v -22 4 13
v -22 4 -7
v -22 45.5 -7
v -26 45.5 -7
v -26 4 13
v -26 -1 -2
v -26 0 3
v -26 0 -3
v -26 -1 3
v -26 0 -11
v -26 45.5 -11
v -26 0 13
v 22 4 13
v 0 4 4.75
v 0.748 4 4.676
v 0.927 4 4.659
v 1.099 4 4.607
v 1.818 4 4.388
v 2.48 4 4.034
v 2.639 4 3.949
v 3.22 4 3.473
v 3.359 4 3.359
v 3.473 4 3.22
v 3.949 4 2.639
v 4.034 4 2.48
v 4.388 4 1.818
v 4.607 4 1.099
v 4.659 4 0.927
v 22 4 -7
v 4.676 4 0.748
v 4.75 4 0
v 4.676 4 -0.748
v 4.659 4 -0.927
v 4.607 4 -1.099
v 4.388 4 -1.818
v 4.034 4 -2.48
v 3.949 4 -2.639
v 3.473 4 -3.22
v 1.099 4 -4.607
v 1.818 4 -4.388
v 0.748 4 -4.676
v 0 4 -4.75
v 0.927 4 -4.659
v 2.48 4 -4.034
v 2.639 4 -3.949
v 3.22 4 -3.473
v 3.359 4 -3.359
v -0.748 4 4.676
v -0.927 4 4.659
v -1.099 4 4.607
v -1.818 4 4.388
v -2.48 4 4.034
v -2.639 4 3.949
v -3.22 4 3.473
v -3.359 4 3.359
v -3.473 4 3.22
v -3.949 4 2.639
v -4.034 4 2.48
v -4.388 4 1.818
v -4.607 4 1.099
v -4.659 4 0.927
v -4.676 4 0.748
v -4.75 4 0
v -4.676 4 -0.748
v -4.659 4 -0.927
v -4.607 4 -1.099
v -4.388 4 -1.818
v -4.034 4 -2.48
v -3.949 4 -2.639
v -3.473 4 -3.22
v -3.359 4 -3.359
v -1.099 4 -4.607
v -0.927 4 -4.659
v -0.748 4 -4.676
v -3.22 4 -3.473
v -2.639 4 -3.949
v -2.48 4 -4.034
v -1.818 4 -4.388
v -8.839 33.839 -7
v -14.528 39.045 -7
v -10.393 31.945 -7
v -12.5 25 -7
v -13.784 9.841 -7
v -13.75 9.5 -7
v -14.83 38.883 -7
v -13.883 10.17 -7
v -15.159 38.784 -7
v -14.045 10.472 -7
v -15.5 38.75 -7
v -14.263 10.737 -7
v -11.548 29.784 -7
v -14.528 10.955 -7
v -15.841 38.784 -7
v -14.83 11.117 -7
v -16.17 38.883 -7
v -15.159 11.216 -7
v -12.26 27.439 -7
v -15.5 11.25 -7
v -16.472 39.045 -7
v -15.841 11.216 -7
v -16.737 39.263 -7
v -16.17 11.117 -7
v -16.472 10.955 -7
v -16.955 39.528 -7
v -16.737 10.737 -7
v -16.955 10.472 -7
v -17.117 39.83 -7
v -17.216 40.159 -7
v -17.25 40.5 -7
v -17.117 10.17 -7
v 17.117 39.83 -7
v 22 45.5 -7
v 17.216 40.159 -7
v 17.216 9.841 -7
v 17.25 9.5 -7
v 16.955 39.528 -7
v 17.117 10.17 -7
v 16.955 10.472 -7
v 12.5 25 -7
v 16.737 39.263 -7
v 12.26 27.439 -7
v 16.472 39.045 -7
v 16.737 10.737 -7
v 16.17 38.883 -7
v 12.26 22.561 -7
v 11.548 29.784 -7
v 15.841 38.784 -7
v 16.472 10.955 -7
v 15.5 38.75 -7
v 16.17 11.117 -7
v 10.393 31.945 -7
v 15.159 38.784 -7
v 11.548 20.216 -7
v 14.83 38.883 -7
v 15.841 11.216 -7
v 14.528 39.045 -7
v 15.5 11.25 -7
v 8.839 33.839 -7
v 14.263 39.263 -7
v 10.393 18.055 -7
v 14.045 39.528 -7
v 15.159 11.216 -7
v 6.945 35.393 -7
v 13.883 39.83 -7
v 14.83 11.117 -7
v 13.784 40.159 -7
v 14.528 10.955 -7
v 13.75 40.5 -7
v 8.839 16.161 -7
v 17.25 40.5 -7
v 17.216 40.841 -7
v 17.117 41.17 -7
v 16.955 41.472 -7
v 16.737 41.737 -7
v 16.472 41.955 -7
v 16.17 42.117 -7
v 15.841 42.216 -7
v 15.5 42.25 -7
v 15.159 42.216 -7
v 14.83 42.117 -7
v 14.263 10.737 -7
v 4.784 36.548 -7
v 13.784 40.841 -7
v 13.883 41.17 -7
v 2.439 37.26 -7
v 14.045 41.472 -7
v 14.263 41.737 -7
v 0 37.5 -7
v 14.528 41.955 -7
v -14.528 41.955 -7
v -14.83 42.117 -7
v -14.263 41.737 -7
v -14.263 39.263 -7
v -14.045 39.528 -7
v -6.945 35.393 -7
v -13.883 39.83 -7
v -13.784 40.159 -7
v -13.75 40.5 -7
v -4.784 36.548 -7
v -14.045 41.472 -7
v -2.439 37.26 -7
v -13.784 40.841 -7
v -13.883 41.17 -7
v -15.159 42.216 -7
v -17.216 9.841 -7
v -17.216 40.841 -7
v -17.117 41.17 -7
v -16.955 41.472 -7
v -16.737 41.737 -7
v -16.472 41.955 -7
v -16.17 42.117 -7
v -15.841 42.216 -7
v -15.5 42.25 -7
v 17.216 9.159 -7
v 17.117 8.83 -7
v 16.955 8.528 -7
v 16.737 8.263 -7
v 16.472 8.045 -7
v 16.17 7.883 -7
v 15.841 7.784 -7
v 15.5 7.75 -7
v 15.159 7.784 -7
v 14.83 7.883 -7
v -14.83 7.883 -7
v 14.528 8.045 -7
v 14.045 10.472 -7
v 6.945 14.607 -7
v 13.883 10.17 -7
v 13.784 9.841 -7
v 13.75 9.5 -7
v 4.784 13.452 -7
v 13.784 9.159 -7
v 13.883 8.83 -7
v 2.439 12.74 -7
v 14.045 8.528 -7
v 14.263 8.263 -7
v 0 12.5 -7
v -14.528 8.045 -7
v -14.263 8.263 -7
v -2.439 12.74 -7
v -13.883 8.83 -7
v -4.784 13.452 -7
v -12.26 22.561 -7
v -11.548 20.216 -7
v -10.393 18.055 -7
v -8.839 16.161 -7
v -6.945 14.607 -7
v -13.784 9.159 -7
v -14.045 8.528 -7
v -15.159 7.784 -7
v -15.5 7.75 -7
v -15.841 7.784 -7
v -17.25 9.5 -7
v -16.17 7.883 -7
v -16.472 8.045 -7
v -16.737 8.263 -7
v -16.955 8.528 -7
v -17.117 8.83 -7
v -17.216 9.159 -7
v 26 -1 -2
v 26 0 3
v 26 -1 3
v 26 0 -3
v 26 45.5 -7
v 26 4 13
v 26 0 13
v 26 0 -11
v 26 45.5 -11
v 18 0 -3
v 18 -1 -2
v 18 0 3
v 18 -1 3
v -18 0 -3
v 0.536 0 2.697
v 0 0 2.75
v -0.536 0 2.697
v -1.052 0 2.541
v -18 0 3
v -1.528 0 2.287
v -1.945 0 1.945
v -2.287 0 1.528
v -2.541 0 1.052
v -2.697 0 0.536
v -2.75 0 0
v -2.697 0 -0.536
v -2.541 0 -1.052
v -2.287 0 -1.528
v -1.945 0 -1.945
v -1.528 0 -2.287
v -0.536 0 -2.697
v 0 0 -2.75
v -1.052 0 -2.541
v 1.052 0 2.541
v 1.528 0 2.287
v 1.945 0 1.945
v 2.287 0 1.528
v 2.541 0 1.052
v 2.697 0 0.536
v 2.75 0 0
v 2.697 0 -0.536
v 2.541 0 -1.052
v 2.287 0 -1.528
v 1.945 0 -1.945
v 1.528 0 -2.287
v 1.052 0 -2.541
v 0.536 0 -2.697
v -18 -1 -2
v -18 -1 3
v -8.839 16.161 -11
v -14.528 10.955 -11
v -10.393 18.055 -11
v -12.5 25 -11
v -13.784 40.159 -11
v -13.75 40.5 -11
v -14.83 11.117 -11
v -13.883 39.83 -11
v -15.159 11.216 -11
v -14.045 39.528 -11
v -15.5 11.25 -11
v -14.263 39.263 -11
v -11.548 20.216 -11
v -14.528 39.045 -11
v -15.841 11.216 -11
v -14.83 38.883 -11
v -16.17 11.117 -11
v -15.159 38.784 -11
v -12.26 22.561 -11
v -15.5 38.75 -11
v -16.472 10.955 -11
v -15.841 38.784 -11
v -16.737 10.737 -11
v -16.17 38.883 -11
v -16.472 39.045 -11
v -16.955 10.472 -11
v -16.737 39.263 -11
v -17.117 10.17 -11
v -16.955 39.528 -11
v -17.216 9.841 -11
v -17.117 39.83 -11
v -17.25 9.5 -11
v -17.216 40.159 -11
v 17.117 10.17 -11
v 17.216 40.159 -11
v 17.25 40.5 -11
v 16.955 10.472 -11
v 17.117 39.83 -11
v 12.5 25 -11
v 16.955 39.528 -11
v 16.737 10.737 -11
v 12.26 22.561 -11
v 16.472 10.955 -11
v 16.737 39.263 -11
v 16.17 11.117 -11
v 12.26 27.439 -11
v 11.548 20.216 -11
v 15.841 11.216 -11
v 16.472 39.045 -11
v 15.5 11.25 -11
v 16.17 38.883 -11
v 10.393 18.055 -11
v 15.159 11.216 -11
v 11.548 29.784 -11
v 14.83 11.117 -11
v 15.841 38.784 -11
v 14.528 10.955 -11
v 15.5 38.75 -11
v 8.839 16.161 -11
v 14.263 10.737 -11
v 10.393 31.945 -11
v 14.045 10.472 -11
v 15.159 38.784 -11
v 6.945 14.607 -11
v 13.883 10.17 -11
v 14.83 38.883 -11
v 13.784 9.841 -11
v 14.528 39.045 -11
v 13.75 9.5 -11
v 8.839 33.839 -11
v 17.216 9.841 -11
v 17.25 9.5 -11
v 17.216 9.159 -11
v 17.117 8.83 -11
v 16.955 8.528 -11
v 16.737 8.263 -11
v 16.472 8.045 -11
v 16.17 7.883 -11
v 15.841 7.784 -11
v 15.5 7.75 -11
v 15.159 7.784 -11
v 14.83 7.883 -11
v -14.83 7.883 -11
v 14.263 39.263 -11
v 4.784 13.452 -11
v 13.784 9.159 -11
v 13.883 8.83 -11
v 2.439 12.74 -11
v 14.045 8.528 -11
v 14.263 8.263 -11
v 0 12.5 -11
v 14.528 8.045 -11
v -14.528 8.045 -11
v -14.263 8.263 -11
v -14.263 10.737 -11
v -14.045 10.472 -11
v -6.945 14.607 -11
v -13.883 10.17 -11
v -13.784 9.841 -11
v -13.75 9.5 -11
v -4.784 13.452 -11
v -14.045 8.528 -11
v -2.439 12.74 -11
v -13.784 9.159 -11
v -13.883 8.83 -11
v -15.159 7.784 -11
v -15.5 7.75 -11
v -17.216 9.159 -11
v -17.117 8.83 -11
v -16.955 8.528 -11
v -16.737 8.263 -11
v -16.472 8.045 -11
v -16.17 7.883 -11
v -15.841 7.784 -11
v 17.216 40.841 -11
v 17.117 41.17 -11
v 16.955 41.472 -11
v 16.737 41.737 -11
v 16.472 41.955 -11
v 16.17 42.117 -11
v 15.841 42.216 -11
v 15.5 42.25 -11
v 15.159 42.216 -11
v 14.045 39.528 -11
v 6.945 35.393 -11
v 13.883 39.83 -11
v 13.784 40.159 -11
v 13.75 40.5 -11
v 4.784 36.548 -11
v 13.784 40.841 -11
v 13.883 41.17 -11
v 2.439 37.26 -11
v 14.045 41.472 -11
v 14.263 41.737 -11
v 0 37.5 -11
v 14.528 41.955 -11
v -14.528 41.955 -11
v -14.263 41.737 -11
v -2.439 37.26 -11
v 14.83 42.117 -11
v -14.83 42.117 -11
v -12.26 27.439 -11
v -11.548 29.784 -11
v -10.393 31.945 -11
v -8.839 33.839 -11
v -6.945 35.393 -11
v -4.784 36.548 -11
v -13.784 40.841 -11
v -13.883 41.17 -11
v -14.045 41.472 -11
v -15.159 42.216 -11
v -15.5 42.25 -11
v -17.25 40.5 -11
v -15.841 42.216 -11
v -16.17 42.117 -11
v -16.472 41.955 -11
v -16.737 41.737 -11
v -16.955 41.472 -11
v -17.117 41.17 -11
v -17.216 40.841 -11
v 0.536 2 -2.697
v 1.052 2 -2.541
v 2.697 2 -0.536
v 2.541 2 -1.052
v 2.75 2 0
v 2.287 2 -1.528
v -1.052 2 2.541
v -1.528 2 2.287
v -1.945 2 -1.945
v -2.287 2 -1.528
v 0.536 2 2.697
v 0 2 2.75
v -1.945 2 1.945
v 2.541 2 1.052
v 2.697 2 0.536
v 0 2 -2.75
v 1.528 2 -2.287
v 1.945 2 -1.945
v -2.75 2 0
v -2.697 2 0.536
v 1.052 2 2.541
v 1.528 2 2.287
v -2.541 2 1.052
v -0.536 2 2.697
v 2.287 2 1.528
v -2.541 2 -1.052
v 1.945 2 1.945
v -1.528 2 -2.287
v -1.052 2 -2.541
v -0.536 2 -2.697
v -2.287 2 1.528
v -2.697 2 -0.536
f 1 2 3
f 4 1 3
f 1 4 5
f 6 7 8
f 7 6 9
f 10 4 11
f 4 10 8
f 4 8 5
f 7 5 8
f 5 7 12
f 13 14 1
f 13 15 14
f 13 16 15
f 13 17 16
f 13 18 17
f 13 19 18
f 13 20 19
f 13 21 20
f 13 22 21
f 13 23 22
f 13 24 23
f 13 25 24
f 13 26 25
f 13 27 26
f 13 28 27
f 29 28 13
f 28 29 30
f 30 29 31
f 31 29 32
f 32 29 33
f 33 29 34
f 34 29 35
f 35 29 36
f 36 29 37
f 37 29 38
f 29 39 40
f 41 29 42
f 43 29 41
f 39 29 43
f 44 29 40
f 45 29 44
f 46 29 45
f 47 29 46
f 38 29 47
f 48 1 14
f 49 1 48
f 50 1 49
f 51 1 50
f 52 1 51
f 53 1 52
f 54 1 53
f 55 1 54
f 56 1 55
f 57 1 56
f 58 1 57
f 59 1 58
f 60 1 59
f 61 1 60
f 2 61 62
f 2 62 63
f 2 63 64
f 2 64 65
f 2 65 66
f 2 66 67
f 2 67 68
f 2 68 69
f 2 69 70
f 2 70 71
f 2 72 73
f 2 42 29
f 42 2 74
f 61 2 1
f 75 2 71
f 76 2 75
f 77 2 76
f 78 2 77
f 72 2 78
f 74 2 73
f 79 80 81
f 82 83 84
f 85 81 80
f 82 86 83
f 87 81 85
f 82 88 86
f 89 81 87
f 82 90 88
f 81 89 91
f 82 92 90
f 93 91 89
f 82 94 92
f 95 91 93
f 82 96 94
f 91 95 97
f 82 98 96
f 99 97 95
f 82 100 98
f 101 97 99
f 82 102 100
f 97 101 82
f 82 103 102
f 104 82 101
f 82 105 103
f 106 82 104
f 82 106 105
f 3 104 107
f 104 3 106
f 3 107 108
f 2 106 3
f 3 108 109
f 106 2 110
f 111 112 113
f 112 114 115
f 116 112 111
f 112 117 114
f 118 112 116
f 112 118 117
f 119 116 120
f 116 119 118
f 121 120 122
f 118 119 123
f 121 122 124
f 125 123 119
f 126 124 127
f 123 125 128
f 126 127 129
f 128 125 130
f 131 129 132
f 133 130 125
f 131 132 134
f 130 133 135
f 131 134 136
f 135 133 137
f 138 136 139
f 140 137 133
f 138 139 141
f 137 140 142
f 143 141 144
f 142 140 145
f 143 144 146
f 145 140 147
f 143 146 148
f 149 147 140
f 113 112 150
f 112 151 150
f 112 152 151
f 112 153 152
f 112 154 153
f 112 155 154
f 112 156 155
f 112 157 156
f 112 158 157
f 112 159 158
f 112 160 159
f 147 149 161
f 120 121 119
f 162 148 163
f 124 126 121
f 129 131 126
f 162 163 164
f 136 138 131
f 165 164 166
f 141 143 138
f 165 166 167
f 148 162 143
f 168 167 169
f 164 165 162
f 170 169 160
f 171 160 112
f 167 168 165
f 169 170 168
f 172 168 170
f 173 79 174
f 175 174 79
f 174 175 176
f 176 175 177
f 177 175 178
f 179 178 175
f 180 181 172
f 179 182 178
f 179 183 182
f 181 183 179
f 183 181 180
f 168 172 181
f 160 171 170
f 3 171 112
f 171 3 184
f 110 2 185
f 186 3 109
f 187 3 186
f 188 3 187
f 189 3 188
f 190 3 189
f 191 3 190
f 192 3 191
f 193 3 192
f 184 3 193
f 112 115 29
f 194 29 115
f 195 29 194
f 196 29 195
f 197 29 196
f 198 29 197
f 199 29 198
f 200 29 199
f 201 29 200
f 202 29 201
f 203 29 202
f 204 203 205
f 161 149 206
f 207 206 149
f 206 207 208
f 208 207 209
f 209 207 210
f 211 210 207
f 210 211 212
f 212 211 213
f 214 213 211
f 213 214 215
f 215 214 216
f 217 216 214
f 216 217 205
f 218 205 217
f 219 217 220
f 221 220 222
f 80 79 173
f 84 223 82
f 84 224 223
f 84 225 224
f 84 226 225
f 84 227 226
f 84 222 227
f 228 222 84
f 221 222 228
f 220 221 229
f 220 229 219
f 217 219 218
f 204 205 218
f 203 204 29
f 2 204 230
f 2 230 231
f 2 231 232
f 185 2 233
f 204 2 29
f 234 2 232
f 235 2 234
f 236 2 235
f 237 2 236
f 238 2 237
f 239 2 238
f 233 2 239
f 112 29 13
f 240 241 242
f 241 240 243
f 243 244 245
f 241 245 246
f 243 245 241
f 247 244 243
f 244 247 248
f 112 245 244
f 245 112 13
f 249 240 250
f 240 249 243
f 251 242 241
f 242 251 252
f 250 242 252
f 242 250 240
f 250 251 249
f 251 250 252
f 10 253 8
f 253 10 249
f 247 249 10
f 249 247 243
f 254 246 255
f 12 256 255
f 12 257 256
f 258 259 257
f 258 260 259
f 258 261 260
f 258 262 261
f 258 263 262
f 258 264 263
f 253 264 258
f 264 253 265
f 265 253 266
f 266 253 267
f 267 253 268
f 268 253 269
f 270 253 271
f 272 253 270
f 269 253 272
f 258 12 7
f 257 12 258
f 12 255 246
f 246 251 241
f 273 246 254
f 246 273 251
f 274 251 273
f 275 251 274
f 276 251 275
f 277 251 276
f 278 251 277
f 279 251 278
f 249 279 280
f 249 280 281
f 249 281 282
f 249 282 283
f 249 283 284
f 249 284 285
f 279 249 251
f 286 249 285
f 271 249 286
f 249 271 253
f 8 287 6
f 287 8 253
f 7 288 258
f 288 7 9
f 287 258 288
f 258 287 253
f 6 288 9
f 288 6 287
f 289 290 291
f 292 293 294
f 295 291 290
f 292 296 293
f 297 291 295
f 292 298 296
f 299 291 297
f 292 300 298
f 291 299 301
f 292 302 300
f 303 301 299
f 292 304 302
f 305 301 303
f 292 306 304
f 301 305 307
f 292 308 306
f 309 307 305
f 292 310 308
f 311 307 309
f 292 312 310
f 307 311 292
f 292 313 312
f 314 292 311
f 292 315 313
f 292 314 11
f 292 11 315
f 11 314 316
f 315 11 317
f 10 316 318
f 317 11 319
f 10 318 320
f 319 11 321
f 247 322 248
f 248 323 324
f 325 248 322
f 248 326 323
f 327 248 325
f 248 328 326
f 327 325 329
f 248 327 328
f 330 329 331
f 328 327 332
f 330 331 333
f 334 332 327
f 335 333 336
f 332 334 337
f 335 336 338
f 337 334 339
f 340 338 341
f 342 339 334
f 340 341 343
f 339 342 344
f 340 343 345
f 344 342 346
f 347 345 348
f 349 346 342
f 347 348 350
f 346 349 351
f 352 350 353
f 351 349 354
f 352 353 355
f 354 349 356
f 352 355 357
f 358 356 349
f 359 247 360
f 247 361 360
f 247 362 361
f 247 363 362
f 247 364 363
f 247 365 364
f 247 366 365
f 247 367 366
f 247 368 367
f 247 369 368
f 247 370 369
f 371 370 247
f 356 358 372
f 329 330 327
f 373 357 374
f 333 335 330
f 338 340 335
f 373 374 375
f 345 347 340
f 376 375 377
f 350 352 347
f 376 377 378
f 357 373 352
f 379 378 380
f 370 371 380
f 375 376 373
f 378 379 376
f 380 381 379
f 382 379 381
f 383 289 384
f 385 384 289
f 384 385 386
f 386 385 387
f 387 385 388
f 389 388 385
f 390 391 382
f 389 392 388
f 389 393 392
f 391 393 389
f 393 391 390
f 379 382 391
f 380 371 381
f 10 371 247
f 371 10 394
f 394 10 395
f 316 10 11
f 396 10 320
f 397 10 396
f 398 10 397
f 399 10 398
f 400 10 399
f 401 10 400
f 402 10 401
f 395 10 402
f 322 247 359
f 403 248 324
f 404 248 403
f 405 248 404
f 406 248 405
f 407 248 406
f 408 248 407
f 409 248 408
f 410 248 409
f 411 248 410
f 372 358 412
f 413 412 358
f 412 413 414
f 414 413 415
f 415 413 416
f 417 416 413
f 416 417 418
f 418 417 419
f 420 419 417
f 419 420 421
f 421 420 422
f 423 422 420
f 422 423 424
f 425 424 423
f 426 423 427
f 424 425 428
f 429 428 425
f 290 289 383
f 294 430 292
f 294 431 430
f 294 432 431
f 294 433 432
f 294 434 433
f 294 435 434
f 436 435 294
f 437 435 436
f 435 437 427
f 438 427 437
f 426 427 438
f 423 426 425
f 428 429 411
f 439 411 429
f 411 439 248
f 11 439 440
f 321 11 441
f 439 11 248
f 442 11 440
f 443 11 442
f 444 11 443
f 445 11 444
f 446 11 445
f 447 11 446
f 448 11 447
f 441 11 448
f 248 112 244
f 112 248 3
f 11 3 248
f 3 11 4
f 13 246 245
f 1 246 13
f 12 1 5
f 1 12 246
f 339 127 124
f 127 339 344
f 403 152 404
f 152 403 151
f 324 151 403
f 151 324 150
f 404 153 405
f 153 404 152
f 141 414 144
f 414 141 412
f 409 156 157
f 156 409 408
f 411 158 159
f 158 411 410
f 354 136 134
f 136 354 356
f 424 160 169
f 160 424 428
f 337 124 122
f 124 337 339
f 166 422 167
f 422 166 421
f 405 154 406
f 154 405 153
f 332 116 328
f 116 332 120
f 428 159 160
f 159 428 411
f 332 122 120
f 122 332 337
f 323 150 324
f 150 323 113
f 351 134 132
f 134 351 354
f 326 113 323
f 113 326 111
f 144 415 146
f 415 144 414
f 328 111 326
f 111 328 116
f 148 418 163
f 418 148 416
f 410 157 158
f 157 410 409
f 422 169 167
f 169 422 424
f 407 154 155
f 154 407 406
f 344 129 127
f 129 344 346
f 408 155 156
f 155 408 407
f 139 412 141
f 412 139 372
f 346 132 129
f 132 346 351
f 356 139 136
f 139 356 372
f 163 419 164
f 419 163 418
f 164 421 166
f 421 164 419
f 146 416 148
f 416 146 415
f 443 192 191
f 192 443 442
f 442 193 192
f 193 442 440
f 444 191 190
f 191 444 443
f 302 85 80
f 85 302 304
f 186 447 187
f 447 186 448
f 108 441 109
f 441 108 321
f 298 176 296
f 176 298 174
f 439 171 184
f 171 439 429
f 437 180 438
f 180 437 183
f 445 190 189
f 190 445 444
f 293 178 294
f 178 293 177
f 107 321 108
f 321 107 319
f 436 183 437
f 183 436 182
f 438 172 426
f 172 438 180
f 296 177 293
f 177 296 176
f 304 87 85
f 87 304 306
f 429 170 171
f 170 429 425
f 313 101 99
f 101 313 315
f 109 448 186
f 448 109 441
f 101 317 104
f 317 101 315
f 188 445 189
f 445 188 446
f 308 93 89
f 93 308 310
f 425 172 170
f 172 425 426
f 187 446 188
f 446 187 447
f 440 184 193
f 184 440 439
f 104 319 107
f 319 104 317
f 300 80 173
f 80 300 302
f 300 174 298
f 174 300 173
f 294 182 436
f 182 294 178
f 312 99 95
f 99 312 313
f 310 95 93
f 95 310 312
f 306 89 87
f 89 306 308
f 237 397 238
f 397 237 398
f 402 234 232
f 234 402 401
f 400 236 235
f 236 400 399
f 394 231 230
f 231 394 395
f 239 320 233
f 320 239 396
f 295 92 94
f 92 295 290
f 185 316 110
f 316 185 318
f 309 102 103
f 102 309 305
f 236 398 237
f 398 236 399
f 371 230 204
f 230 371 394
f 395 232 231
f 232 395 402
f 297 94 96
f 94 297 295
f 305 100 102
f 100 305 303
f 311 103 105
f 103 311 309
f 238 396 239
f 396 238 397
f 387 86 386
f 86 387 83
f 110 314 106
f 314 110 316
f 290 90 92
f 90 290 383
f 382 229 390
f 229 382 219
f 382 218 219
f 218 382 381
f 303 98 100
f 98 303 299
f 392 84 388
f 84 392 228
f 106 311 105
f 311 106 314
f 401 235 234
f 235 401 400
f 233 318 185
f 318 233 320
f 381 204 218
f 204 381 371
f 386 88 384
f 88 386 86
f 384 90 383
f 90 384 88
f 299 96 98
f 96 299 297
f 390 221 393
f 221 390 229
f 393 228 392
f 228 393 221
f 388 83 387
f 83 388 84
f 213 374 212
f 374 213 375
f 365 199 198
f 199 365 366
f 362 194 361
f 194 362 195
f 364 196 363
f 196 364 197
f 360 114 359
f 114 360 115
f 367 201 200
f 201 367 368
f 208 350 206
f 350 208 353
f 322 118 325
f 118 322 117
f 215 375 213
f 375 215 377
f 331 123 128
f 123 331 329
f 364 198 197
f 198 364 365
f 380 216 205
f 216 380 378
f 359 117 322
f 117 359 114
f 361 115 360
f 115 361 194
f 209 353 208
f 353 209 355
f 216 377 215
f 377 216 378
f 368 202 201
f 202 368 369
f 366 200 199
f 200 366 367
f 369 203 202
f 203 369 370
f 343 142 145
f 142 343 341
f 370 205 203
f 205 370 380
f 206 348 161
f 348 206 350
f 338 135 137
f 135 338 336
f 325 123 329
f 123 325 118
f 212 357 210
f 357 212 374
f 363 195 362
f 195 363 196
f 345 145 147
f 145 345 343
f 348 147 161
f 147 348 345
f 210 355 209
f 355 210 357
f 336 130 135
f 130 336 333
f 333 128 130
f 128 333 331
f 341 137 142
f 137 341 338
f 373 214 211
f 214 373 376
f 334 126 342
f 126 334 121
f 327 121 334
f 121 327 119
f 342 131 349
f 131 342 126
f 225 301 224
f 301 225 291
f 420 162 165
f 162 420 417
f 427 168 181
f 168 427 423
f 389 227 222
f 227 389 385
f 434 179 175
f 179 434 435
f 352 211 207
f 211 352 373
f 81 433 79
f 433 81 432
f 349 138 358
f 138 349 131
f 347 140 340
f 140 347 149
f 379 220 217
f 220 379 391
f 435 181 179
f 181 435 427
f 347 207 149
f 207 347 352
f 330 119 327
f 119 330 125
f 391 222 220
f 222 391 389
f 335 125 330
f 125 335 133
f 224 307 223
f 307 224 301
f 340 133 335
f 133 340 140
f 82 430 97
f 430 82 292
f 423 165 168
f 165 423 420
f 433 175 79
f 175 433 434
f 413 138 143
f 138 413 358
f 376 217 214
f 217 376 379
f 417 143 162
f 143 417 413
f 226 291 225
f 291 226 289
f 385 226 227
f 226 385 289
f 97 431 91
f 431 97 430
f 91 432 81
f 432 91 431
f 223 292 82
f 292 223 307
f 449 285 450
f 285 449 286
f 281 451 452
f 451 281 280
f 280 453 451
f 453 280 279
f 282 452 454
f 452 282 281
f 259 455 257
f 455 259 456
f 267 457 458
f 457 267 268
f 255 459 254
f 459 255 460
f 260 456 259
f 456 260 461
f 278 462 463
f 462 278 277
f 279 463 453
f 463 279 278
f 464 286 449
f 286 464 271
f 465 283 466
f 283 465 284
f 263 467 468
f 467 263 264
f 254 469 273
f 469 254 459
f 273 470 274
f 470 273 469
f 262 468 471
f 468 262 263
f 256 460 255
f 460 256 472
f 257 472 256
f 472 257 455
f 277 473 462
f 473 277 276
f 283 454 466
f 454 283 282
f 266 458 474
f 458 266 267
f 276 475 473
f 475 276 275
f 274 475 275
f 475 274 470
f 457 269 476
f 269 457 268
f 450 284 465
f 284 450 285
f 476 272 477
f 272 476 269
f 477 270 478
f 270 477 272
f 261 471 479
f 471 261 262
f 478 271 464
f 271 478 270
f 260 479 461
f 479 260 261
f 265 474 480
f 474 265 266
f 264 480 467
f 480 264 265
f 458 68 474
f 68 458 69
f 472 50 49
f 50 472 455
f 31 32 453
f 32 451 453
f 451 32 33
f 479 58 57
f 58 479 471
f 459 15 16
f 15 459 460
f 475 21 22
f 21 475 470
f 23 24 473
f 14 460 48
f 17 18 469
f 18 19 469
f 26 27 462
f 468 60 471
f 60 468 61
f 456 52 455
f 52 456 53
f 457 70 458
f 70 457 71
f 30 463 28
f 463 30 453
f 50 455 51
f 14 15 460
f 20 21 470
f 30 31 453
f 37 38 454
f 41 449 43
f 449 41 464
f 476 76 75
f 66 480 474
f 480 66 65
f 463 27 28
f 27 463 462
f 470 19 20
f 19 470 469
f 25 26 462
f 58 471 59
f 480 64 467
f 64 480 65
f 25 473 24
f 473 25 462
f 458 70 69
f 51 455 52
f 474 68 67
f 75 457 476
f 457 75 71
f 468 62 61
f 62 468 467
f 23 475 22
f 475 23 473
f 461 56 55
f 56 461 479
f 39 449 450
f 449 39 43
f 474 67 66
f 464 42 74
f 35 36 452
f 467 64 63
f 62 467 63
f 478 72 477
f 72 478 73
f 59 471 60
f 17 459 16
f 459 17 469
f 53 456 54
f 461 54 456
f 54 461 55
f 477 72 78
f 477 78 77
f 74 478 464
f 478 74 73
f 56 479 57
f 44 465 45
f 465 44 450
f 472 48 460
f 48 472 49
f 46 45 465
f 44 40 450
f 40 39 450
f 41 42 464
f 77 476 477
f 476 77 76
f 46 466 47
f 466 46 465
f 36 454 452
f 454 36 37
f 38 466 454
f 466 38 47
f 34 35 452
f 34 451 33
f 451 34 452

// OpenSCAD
// file: modules.scad
// Fonctions personnalisées

//http://forum.openscad.org/Wish-mirror-copy-true-td10681.html
module copy_mirror(vec=[0,1,0])
{
    children();
    mirror(vec) children();
}

module ecrou(plat,h){
  cylinder(d=plat*2/sqrt(3), h=h, $fn=6);
}


module courroie(diam,longueur){
  color ("black")
  difference(){
    hull(){
      cylinder(d=diam+1, h=6, $fn=32);
      translate([longueur,0,0]) cylinder(d=diam+1, h=6, $fn=32);
    }
    translate([0,0,-1])
    hull(){
      cylinder(d=diam-1, h=8, $fn=32);
      translate([longueur,0,0]) cylinder(d=diam-1, h=8, $fn=32);
    }
  }
  
  
}
// file: config.scad
// Paramètres de la machine

decal=-30;            // décallage du chassis xz
hauteur=400;          // hauteur totale chassis
largeur=400;          // largeur totale chassis
longueur=470;         // longueur totale chassis
hauteur_base=90;      // hauteur de la base
entraxe_y=140;        // distance entre les tiges Ø8 axe Y
entraxe_x=45;         // distance entre les tiges Ø8 axe X

couleur=[1,0.6,0];


// Plats écrous
ec3=5.7;
ec4=7.2;
ec5=8.2;
ec6=10.2;

// Jeu sur plats pour les écrous glissants
jec=0.2;

// hauteur écrous
ec3h=2.4;
ec4h=3.2;
ec5h=4.7;
ec6h=5.2;

// Vis
vis3=3.5;
vis4=4.5;
vis5=5.5;
vis6=6.5;


// Paramètre des pièces et jeux

// écart plateau/courroie
// y_belt_holder
belt_h=13;      // écart entre la courroie et le plateau

// écart plateau/tiges lisses
// y_lm8uu
decal_plateau=12; // Décallage en Y

// décallage des tiges lisses Y
// support_tige8_y
decal_tiges=5;

// décallage moteur Y
// y_motor
decal_motory_z=11;
decal_motory_y=25;

// Equerres de fixation position fermée
eq_ec=10;      // écart entre profilés

// Fixations axe Z
pos_z=26;      // position des axes par rapport au profilé (>= 21)
hauteur_z=20;  // hauteur des fixations
entraxe_z=17;  // distance entre les tiges Ø8 et M5
// est ce que la tige de 8 dépasse du profilé de 30?
// si oui, on décale les fixations
decalx=max(-42/2+entraxe_z+8/2+2, 0);

// Roulements linéaires
lbd = 15; // diamètre ext
lbh = 24; // hauteur

// x_carriage
he_x=23;  // entraxe hotend x
he_y=23;  // entraxe hotend y
sen_x=20; // entraxe capteur x
sen_y=23; // entraxe capteur y

// sensor_holder
sen_ep=3;   // épaisseur
sen_d=12.5; // diamètre du capteur
sen_pos=0;  // décentrage en x du capteur
sen_z=7;    // position Z de la bague

// y_belt_idler
ybi_ep1=4;       // épaisseur de la partie fixe
ybi_ep2=4;       // épaisseur de la partie mobile
ybi_h=16;        // position de l'axe
ybi_ec=11;       // écart pour le passage du ou des roulement
ybi_vis=vis4;    // diamètre passage de vis (axe)
ybi_ecrou=ec4;   // plat écrou
ybi_ecrouh=ec4h; // hauteur écrou
ybi_long=60;     // longueur de la partie mobile entre axes
ybi_prof=15;     // largeur de la partie mobile


// nombre de dents des poulies
poulie=20;

// Pas des courroies
pas=2;

// diamètre des poulies
dpoulie=poulie*pas/3.1416;
// main file
// eLKa1
// y_motor
// GNU GPL v3
// lkiefer <blog.lkiefer.org> and contributors
// http://www.reprap.org/wiki/ELKa
// https://github.com/kimented/elka1

include <config.scad>;
use <modules.scad>

module y_motor(){
  largeur=44;
  ep=4;
  entraxe=31;
  
  decaly=decal_motory_y-ep;
  decalz=decal_motory_z-ep;
  profondeur=decaly+entraxe/2+5;
  $fn=32;
  echo ("y_motor");
  
  color(couleur)
  translate([0,ep,-decalz])
  difference(){
    union(){
      translate([-largeur/2-ep,-ep,-ep]) cube([largeur+2*ep,profondeur+ep,ep]);
      translate([-largeur/2-ep,-ep,0]) cube([largeur+2*ep,ep,decalz+13]);
      copy_mirror([1,0,0]) translate([-largeur/2,0,0]) rotate([0,-90,0]) linear_extrude(ep) polygon([[0,0],[decalz+13,0],[0,profondeur]]);
      copy_mirror([1,0,0]) translate([largeur/2+ep,-ep,decalz-6/2]) rotate([90,0,-90]) linear_extrude(8) polygon([[0,0],[0,6],[1,6],[1,1]]);
    }
    translate([0,decaly,-ep-1]) cylinder(d=25, h=ep+2);
    translate([0,decaly,-ep-1])
    for (i=[0:3]){
      rotate([0,0,90*i]) translate([entraxe/2,entraxe/2,0]) cylinder(d=vis3, h=ep+2);
    }
    translate([0,-ep-1,decalz]) rotate([-90,0,0]) cylinder(d=vis5, h=ep+2);
    translate([0,-2,decalz]) rotate([-90,0,0]) cylinder(d1=vis5, d2=vis5+6, h=3);
    
  }
}

y_motor();
